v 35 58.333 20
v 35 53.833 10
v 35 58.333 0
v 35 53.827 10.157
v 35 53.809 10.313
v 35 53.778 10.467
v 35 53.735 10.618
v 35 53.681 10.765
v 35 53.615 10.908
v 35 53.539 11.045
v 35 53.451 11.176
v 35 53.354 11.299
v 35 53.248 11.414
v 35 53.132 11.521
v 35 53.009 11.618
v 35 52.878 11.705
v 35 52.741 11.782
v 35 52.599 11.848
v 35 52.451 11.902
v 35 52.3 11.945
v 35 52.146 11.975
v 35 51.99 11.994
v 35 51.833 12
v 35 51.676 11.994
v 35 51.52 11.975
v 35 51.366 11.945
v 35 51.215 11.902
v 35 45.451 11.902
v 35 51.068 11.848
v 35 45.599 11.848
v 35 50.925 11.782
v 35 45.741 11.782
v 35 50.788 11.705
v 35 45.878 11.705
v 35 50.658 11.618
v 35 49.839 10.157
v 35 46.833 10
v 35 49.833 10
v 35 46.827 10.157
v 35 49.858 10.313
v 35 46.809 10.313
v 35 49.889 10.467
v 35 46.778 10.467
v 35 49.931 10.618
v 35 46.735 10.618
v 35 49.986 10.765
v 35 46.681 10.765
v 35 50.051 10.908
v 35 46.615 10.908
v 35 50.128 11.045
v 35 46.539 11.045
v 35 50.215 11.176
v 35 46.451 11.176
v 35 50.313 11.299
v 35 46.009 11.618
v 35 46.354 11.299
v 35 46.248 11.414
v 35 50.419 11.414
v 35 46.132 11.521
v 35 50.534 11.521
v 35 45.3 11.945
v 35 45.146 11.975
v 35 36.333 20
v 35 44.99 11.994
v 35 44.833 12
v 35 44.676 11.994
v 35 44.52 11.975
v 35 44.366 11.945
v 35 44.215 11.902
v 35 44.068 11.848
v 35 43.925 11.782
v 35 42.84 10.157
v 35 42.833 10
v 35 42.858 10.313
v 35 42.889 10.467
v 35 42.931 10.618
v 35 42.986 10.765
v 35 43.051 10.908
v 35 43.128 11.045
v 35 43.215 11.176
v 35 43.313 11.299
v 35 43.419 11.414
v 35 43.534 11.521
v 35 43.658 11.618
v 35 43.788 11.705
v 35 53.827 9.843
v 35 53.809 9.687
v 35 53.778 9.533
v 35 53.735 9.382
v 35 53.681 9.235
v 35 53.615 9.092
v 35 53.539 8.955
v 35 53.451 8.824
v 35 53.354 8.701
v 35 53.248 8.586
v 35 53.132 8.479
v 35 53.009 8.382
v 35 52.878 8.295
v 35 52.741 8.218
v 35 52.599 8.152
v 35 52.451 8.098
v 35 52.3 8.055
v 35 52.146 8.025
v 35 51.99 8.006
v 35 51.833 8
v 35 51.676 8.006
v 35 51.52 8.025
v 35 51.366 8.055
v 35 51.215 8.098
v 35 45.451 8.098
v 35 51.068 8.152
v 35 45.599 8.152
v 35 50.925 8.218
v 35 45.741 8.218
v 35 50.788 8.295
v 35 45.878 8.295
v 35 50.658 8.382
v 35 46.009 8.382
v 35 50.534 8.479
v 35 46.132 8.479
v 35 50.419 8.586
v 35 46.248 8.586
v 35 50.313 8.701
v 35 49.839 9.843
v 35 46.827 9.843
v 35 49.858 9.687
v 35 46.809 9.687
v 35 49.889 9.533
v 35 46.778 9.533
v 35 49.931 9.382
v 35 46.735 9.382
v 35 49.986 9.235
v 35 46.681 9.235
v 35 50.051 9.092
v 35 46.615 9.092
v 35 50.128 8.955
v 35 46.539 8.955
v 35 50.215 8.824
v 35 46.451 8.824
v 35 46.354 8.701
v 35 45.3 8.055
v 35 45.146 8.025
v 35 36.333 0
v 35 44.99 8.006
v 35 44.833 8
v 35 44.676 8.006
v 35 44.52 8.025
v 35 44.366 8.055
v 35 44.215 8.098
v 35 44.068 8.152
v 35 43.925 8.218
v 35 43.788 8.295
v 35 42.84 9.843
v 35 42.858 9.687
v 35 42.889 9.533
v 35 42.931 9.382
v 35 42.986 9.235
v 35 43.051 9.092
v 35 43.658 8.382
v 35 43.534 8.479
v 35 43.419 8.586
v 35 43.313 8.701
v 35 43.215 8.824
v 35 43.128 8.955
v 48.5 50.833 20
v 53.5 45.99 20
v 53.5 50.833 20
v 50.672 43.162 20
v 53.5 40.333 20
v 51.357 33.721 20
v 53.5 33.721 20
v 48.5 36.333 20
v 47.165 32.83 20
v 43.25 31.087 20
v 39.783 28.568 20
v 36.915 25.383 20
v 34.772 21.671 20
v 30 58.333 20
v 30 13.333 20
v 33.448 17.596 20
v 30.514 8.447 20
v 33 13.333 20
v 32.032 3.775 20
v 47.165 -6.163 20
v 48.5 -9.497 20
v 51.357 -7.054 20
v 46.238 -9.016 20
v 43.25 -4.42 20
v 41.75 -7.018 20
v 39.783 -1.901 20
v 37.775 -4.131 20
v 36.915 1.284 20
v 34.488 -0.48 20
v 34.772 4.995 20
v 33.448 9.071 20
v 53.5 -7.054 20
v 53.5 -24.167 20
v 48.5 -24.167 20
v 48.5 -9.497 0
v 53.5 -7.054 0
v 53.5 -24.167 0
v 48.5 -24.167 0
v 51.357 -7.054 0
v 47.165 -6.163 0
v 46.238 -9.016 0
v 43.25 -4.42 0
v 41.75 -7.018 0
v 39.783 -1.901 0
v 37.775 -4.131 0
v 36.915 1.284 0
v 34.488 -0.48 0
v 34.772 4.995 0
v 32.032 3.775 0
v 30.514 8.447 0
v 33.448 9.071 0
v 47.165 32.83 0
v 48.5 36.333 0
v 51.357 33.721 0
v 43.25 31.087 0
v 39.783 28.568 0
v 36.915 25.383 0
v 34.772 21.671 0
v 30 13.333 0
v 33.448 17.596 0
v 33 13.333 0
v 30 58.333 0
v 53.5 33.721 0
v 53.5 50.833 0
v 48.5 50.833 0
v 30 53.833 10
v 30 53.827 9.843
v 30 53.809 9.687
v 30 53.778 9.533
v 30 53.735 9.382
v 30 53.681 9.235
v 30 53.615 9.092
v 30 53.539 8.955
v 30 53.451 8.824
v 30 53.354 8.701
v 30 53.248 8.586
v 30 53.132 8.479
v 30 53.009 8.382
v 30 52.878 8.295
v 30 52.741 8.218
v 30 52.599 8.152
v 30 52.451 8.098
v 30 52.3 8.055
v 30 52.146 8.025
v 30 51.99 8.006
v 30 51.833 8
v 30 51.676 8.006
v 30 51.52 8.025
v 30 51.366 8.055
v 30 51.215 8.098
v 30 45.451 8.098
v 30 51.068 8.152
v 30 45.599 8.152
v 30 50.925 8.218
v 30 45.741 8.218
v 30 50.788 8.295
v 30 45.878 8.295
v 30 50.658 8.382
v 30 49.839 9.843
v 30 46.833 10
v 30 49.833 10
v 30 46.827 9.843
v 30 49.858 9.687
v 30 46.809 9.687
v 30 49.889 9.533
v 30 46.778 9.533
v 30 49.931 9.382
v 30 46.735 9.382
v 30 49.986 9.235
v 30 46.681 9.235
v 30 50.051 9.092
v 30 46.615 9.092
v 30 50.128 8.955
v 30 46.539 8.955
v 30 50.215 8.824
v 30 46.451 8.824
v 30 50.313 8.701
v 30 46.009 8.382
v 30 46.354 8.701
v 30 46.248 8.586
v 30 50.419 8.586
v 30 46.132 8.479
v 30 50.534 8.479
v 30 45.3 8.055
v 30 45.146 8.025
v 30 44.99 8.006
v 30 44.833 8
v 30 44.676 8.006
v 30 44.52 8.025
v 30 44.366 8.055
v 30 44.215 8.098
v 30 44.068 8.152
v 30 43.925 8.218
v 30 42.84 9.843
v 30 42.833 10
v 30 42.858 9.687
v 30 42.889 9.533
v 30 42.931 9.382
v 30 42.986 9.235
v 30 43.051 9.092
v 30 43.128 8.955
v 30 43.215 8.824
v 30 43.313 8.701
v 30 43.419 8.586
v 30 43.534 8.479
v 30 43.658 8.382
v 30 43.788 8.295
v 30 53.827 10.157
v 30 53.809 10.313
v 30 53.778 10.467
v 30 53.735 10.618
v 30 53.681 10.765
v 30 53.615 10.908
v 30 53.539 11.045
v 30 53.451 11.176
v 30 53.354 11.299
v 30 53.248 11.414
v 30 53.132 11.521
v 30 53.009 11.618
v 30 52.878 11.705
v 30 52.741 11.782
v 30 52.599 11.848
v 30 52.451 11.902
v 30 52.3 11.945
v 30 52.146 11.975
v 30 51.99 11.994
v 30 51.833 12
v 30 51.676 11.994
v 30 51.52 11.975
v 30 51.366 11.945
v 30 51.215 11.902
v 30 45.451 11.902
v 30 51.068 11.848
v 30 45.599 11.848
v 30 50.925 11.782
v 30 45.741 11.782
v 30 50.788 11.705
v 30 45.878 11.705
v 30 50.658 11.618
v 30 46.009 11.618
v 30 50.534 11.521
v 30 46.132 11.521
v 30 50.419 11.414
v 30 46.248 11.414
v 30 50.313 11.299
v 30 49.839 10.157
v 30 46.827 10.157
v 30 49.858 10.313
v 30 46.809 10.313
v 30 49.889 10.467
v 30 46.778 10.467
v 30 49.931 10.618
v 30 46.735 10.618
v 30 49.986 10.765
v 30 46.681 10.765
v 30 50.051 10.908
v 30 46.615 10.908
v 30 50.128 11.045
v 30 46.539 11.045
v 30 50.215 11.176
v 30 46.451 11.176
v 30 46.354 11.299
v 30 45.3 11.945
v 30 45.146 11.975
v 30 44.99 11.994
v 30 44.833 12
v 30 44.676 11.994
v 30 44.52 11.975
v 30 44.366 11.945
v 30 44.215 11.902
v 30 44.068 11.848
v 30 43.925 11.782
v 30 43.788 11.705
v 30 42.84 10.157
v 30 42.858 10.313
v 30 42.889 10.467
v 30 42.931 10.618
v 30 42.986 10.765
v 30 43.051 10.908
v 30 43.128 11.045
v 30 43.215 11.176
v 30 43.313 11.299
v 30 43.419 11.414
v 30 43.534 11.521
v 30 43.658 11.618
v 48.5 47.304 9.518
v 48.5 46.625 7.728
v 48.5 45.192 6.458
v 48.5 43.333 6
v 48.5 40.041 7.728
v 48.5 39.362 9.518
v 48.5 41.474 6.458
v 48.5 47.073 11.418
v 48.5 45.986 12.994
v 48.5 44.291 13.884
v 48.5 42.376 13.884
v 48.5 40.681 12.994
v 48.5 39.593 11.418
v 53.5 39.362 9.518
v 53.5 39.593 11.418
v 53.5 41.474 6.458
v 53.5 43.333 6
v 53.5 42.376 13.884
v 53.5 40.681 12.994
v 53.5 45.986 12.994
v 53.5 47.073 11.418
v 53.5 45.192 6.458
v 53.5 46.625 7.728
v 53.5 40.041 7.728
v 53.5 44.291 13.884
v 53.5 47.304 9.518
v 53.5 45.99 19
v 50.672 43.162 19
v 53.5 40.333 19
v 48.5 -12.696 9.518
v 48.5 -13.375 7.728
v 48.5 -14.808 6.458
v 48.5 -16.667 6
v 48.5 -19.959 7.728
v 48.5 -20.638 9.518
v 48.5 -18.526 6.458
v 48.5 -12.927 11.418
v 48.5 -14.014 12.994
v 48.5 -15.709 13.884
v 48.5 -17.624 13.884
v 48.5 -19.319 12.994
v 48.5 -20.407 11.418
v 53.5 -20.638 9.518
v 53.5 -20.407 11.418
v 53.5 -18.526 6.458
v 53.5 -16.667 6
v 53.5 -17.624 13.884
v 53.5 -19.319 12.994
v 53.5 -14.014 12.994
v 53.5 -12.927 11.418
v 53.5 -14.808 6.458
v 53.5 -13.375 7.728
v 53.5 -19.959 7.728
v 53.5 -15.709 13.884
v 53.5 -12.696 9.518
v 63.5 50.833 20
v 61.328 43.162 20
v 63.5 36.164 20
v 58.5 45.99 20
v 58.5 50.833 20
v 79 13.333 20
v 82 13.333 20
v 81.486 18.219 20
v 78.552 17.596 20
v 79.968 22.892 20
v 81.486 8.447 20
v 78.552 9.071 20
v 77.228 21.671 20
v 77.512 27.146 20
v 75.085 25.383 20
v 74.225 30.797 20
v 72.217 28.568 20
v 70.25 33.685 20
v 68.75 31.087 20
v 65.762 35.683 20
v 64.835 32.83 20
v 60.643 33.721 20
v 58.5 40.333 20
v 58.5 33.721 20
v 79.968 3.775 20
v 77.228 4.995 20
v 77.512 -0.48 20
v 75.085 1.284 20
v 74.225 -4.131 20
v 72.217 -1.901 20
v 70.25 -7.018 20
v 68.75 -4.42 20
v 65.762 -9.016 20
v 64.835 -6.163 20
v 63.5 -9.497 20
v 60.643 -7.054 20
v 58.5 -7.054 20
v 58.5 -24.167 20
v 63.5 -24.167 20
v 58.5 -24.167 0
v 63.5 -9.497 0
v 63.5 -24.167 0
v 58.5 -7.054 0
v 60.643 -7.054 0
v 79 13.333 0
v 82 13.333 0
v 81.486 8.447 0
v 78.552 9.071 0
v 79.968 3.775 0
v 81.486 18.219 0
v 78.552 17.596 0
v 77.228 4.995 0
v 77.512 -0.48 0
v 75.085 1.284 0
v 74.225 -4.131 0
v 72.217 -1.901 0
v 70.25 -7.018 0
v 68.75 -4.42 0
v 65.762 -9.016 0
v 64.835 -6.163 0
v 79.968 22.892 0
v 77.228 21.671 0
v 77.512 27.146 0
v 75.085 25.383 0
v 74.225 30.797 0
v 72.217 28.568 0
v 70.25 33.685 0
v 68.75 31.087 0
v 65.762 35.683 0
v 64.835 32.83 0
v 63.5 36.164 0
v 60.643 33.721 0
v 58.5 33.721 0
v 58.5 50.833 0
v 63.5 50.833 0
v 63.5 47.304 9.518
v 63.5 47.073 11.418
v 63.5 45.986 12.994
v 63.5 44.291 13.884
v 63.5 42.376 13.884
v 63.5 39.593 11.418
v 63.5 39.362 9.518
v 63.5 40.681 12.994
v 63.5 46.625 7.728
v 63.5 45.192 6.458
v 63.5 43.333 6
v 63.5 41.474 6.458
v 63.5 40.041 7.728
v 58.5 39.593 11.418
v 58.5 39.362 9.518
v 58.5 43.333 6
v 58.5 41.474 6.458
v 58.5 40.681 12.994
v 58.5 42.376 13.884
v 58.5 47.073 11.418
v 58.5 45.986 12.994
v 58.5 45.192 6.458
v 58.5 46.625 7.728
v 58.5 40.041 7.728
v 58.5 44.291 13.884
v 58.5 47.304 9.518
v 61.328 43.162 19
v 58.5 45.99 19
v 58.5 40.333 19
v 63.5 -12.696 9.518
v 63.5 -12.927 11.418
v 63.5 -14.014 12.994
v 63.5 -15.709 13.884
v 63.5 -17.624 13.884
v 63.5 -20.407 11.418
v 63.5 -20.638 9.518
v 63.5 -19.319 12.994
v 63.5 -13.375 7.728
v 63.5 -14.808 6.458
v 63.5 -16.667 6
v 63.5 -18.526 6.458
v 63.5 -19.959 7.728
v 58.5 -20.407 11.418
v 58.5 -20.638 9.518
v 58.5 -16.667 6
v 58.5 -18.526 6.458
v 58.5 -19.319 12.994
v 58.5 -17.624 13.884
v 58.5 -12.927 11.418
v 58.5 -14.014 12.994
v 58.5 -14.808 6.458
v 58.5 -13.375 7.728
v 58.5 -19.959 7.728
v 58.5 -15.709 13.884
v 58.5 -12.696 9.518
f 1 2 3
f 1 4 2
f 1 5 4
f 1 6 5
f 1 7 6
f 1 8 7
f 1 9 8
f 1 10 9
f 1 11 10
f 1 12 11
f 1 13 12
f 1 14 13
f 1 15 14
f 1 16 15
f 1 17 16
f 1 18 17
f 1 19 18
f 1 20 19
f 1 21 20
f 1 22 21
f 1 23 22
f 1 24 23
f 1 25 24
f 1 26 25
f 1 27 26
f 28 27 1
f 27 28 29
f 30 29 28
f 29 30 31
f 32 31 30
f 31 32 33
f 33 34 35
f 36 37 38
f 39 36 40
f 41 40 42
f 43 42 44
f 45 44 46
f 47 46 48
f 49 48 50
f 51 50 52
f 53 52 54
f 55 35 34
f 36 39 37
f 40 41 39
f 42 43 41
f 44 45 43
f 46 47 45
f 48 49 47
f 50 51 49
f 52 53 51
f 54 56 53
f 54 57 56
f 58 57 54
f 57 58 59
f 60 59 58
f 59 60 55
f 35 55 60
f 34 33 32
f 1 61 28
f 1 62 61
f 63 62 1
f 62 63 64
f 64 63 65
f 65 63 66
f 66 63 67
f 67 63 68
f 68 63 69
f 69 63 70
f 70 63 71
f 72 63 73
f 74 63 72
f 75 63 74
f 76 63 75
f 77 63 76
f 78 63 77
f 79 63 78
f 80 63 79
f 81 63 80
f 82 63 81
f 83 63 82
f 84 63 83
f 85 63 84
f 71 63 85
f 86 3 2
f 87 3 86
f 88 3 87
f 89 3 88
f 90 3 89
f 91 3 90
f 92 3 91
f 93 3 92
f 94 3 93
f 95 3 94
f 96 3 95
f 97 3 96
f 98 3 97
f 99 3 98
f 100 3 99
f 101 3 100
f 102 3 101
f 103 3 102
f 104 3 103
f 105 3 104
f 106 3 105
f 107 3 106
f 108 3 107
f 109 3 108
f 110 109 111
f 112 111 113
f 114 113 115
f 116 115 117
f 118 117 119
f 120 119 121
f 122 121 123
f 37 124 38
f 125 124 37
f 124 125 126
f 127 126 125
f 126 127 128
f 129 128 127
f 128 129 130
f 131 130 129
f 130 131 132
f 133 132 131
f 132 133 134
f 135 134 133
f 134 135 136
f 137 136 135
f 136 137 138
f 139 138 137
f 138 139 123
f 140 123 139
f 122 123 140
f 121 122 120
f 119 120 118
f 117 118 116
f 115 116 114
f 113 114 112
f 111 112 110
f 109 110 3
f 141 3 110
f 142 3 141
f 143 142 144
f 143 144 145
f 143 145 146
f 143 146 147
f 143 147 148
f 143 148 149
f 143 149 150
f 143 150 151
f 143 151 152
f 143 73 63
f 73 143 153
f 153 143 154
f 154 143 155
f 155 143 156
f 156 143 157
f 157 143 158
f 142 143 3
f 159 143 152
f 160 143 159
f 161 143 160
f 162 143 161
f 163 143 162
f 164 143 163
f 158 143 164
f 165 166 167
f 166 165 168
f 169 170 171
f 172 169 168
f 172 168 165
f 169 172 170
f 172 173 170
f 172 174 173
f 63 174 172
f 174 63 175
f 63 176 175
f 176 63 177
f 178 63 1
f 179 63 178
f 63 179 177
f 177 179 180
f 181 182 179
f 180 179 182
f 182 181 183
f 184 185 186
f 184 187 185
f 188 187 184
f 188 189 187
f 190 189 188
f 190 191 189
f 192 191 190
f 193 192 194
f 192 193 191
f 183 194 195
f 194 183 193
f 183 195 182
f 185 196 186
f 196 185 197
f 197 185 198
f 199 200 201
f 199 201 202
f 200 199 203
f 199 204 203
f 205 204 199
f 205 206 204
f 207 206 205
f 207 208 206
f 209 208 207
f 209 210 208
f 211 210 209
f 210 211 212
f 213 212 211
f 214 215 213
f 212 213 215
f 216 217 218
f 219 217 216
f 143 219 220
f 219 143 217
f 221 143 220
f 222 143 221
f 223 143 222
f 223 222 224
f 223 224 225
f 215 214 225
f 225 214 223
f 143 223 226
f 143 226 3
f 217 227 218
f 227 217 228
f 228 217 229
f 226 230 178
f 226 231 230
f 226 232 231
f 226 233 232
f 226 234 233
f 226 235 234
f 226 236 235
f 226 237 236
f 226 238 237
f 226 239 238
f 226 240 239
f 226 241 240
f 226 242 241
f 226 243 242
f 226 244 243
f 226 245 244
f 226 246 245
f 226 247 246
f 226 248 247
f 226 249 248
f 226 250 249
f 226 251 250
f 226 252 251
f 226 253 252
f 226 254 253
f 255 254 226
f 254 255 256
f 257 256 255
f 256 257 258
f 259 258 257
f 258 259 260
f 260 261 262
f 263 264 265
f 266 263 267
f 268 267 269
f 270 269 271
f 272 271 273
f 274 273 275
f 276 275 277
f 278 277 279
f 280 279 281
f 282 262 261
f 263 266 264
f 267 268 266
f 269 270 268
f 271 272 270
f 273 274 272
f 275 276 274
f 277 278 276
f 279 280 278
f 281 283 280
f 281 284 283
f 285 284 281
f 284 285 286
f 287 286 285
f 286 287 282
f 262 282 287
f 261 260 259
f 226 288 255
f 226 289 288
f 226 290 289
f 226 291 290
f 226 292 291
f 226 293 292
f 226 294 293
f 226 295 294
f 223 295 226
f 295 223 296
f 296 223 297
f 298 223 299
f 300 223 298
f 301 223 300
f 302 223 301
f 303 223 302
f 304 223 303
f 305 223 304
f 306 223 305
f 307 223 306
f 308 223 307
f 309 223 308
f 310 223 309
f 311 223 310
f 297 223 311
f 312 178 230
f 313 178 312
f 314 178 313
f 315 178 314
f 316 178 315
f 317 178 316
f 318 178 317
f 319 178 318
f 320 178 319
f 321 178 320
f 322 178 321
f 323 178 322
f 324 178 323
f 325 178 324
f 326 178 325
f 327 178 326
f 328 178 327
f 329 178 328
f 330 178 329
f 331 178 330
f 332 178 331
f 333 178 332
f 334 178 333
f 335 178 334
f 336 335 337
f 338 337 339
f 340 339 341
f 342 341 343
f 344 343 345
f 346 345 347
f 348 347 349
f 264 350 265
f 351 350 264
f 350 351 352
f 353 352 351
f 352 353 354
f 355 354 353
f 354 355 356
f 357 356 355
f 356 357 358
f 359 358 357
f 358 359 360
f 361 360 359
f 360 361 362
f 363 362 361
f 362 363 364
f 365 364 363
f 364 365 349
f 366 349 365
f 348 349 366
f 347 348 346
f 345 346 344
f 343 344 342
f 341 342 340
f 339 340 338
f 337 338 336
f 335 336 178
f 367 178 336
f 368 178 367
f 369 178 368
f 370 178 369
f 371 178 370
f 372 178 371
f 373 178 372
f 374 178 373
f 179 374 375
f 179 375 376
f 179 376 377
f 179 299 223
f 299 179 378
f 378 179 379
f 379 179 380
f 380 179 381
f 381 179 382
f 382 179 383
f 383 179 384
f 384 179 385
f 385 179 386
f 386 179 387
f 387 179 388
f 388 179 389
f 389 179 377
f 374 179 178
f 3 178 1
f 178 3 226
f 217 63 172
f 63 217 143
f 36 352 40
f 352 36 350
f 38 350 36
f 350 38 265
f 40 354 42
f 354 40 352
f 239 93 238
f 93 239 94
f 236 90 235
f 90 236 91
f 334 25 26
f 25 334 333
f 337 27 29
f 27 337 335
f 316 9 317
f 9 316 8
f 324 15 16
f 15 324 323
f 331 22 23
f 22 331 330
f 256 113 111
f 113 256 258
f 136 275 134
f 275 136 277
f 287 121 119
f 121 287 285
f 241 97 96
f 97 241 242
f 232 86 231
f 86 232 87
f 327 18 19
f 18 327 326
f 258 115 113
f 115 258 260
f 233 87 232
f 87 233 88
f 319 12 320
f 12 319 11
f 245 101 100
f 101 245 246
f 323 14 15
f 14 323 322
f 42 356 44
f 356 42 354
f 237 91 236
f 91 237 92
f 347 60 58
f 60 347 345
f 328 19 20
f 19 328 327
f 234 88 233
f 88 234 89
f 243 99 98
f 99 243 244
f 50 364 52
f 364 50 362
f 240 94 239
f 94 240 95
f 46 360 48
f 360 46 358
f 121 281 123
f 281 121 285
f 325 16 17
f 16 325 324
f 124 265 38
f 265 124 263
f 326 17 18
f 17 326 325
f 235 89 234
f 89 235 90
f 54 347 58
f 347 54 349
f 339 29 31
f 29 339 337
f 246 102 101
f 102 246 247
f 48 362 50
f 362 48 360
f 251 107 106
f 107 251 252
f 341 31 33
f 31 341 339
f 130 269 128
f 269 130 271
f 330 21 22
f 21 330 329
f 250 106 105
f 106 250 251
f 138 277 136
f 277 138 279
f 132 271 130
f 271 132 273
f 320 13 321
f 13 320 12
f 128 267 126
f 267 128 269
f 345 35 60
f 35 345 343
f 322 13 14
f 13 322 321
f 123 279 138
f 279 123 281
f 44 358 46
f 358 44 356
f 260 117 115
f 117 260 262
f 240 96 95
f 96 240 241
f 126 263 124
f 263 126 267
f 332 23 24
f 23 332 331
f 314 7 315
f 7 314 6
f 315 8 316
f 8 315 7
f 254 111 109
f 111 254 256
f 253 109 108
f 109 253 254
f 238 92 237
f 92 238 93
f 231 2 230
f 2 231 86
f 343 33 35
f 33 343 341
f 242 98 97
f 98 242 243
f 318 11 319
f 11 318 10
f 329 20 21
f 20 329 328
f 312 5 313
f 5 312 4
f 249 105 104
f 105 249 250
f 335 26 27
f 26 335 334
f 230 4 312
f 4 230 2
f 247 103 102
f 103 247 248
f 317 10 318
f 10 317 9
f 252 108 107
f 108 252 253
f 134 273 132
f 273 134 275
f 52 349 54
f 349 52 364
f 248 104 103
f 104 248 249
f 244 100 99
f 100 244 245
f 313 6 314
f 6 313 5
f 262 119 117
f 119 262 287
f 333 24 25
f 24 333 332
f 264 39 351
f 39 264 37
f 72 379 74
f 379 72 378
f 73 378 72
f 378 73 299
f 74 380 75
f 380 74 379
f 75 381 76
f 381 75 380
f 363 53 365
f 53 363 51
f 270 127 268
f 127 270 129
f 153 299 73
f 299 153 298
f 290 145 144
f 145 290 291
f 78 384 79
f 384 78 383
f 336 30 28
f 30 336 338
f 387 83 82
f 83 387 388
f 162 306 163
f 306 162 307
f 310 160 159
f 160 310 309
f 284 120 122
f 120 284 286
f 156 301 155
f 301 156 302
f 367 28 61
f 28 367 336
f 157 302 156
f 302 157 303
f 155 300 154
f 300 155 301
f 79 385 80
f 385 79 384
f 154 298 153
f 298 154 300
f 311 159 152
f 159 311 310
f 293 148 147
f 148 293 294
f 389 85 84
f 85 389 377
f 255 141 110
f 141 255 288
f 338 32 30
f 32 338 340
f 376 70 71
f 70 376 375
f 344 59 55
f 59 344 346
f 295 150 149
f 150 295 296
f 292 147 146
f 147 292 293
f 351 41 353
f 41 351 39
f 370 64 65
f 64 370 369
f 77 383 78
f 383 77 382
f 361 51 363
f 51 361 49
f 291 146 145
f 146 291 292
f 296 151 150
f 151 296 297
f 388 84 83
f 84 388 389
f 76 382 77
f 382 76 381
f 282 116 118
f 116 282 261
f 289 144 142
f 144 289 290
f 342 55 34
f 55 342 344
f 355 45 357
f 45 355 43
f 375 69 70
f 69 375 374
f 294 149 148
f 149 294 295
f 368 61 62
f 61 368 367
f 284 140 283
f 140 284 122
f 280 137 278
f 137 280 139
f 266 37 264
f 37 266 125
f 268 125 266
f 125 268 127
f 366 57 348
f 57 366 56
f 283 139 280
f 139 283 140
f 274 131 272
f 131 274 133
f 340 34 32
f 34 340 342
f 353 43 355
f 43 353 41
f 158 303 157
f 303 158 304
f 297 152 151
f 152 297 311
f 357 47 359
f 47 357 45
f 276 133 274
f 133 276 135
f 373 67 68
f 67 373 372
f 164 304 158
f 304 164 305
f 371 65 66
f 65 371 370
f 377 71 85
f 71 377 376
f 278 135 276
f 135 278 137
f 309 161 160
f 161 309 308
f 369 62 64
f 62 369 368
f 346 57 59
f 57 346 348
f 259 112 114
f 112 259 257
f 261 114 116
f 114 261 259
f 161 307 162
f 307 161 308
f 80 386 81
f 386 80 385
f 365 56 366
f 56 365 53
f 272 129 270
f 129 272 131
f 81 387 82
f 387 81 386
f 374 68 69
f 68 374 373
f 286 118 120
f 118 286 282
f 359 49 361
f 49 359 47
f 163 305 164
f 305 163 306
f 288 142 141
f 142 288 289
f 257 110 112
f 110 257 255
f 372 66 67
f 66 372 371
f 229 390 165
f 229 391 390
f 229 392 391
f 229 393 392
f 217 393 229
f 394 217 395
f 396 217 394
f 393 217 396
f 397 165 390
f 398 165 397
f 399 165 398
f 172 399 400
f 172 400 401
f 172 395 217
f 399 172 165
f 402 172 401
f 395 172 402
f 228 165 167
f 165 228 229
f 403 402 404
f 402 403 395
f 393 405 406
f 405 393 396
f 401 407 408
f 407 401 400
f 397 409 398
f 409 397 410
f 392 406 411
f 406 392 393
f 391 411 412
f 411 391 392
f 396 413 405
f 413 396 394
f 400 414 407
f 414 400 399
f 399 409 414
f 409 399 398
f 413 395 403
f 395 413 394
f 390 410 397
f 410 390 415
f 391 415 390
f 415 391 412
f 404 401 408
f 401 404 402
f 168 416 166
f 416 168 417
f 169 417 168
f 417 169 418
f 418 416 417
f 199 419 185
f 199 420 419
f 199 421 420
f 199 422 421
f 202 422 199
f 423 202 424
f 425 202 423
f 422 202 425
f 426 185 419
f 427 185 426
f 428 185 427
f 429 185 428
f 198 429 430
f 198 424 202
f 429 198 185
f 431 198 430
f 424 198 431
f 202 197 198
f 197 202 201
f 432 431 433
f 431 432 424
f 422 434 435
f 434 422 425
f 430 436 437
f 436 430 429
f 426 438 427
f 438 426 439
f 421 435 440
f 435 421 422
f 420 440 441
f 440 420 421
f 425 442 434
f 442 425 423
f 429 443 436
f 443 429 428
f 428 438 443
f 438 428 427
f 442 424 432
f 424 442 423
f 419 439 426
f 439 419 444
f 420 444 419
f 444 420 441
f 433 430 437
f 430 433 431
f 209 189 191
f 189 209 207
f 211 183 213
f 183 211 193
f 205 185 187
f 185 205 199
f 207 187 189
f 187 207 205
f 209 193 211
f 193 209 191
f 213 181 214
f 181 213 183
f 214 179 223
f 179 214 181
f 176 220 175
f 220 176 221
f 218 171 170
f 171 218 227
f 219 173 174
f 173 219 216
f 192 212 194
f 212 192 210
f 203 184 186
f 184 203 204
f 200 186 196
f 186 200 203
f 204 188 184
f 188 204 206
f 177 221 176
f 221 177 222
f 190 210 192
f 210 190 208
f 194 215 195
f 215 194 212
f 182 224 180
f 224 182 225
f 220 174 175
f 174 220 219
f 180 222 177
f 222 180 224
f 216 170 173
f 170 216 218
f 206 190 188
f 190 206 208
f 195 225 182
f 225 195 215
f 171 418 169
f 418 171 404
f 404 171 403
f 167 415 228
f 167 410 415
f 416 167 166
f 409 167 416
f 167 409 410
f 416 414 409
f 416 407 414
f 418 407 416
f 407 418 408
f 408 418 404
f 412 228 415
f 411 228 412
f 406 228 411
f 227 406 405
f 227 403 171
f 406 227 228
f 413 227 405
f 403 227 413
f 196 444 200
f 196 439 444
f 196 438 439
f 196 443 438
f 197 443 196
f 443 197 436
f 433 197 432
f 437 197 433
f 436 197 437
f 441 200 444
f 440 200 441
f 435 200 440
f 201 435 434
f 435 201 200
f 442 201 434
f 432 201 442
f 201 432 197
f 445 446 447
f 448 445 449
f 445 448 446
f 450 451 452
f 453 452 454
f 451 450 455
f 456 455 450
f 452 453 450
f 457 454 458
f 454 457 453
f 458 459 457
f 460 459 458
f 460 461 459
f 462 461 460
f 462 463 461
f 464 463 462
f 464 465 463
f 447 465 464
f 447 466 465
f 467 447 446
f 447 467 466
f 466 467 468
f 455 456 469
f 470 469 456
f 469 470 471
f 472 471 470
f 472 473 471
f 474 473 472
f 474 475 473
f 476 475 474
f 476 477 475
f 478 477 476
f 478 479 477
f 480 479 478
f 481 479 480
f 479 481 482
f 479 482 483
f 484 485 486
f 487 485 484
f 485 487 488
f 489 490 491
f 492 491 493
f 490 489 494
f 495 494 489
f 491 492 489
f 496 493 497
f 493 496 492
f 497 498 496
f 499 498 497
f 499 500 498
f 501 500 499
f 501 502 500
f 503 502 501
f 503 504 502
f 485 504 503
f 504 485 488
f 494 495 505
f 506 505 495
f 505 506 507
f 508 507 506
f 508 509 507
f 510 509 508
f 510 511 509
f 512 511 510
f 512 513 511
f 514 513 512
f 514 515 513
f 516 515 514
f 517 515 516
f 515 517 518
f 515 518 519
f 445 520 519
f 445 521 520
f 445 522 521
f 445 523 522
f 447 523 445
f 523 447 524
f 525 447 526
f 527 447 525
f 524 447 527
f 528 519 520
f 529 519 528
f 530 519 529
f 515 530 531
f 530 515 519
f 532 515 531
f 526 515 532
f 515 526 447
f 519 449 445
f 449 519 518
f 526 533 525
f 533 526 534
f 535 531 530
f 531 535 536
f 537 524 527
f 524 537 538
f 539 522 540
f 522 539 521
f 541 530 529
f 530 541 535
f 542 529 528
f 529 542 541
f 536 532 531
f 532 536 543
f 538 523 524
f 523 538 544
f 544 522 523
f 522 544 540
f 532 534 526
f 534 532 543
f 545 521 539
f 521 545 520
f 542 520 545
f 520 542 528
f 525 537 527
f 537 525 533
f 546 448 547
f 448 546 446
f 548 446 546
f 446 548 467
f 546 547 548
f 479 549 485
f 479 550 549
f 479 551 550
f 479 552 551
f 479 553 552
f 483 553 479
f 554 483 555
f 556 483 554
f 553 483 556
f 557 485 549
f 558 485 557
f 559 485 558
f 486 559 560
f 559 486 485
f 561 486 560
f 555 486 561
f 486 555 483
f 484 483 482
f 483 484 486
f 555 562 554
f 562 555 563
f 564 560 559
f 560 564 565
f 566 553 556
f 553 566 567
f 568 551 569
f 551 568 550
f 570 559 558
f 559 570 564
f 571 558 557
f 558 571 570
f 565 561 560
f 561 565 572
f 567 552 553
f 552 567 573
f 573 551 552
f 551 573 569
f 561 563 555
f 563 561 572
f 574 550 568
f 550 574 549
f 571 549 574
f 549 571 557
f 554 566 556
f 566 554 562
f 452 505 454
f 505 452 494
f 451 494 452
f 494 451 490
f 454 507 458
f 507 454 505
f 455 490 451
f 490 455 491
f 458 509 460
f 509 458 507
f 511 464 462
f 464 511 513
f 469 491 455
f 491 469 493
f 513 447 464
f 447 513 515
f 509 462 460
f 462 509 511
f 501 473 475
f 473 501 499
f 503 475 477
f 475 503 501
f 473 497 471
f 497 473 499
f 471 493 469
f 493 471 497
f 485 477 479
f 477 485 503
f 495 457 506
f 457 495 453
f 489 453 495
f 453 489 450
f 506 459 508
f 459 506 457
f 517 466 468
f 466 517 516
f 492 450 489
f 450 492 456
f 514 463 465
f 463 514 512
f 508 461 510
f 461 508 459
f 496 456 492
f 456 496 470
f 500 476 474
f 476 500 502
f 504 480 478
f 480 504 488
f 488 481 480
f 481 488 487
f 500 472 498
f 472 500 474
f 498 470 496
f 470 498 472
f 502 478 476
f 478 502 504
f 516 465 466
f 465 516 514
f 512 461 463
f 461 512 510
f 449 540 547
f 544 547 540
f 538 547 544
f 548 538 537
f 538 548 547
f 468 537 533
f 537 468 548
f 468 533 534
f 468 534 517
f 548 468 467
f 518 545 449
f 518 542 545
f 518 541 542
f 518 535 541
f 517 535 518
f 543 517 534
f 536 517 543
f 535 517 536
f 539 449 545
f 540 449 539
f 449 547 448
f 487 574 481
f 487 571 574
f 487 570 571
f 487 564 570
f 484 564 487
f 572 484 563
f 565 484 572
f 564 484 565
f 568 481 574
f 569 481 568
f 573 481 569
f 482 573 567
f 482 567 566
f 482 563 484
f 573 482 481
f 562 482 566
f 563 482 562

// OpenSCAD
// file: side-mount.scad
/*
 * Side panel of the rack which has mounting holes to mount the rack in some other enclosure or racking.
 */

use <warpDisk.scad>;
use <boltHoles.scad>;

/*
 * Side mounting holes.
 *
 * Use this module to add these holes to your own module so they align up correctly
 * with this panel
 */
module SideMount(thickness) {
    for(x=[-3.5,3.5]) {
        for(y=[-13,13]) {
            translate([x,y,-1])
                MHole(3,thickness+2);
        }
    }
}
/*
 * Full size side panel - This defines a full size
 * side=0 for left, 1 for right
 */
module FullSidePanel(width, height, thickness,side=0) {
    difference() {
        union() {
            // Panel
            cube([thickness,width,height]);

            // Side mounts
            x= side==0 ? thickness-1 : -13;
            for(z=[2,height-thickness]) {
                translate([x,21,z])
                    cube([15,20,3]);
            }
        }

        // Mounting holes
        translate([0,25,height/2])
            rotate([90,0,90])
            SideMount(thickness);
        /* Alternate arrangement with 2 sets of holes
        for(y=[30,height-30]) {
            translate([0, 25, y]) rotate([90,0,90]) SideMount(thickness);
        }
        */

        // Mounting holes onto the top/bottom plates
        x= side==0 ? 10 : -5;
        for(z=[2,height-thickness]) {
            translate([x,35,z-1])
                MHole(4,5);
        }

        /* Cutouts for easy removal from the bed */
        for(y=[0,135]) {
            translate([-2,18,y-1])
                cube([3,4,3]);
        }
        for(x=[40,70,96]) {
            translate([-2,39,x-1])
                cube([3,3,4]);
        }
    }

}
// file: boltHoles.scad
/*
 * This code is licensed under the CC BY-NC-SA 4.0 (Attribution-NonCommercial-ShareAlike).
 * Please read LICENCE.md for full details.
 *
 * A set of modules for creating bolt holes at specific sizes
 *
 * All of these modules will render flat on the XY plane and centered on the origin.
 * Heights are measured along the Y axis.
 * Widths are measured along the X axis.
 * Thickness are measured along the Z axis.
 */

/*
 * M mounting hole. Radius is (Msize/2) + 0.25mm
 * The 0.5mm gives some extra room so the bolt does not get restricted by the plastic & is free to move.
 *
 * size The size of the hole, e.g. 4 for a M4 bolt
 * t    The thickness of the material the hole is in
 */
module MHole(size,t) {
    translate([0, 0, -1]) cylinder( r=(size/2)+.5, h=t+2, $fn=80);
}

/*
 * A rectangular slotted hole for bolts, used so there's some directional movement in attaching something.
 *
 * boltSize     The diameter of the bolt this slot is to fit. 0.5mm either side will be included in the slot
 * height       The height of the slot in mm
 * thickness    The thickness of the material the slot is to cut out.
 */
 module BoltSlot( boltSize,height, thickness) {
    translate([-(boltSize+1)/2,-height/2,-(thickness+1)/2])
        cube([boltSize+1, height, thickness+1]);
 }

/*
 * A bar with multiple slots cut out of it
 *
 * width The width of the bar
 * height The height of the bar
 * thickness The thickness of the bar
 * boltSize The size of bolt that will be used in the slot, remember slots are 10mm apart!
 * baseOffset The offset from the bottom to the bottom of the slot
 * topOffset The offset from the top of the slot from the top of the bar
 */
module SlottedBar(width, height, thickness, boltSize, baseOffset, topOffset) {
    bo = baseOffset <=0 ? thickness : baseOffset;
    to = topOffset <= 0 ? thickness : topOffset;
    
    // Y offset to middle of slot
    dy = baseOffset + ((height-baseOffset-topOffset)/2);
    
    // last slot index that fits, first slot is #0
    numSlots = floor(width/10)-1;
    
    translate([-width/2, -height/2, -thickness/2])
        difference() {
            // Actual bar
            cube([width, height, thickness]);
            for( n = [0:numSlots] ) {
                translate([ 5+(10*n), dy, thickness/2 ])
                    BoltSlot( boltSize, height-baseOffset-topOffset, thickness );
            }
        }
}

SlottedBar( 100, 20, 5, 4, 5, 5 );

translate([0,30,0])
SlottedBar( 100, 20, 5, 4, 7, 5 );

//BoltSlot( 4, 20, 5);
// file: warpDisk.scad
/*
 * This code is licensed under the CC BY-NC-SA 4.0 (Attribution-NonCommercial-ShareAlike).
 * Please read LICENCE.md for full details.
 *
 * A warp disk which is a simple 10mm x 0.6mm disk which is placed just touching a base corner of your model.
 * These disks then give the model extra area against a heated base plate on the printer and help in reducing
 * warping of the model
 */

module WarpDisk(x,y,z) {
    translate([x,y,z]) cylinder(r=5,h=.6,$fn=30);
}
// main file
/*
 * This code is licensed under the CC BY-NC-SA 4.0 (Attribution-NonCommercial-ShareAlike).
 * Please read LICENCE.md for full details.
 *
 * This is specific to my use case but this provides the means to attach our angle
 * brackets to an existing rack system.
 *
 * In my case this is plastic racking from a DIY store which has a 40mm diameter round
 * posts which this wraps around.
 *
 * It's here so we have an example of how to make custom mounts for other types of racking.
 *
 * Note: This is the raw original and hasn't been converted to use the common modules
 *       so there are some duplication. At some point I might clean this one up
 *       but as this is custom I've left it as is.
 */

use <warpDisk.scad>;
use <boltHoles.scad>;
use <side-mount.scad>;

/*
 * Mounting bracket
 */
width=40;
height=20;
t=5;

/*
 * holderDiam is the diameter of round holder.
 * Adjust this to be the inner diameter you are attaching the bracket to.
 * This doesn't need to be accurate but close & bigger the better.
 *
 * holderThickness is the thickness in mm of the bracket. Doesn't need to be
 * too thick but not too think that it'll break. 2 or 3mm is usually enough.
 */
holderDiam=41;
holderThickness=3;

module bracket( top ) {
    translate([6.5+holderThickness+holderDiam/2,0,0])
        difference() {
            union() {
                cube([t,width+5,height]);
                cube([t*4,2.5+holderDiam/2,height]);
                //cube([t*4,width-2.5,2]);
            }
            translate([5,10+(width+10)/2,height+3])
                rotate([180,90,0])
                rotate([0,0,90])
                SideMount(t);
        }
    /*
    rotate([ 90*top, 0, 0]) union() {
        //slottedPanel();
        //rotate([90,0,0]) translate([0,0,-t]) slottedPanel();
    }
    warpDisk(-3,-3);
    warpDisk(-3,height+3);
    warpDisk(width+3,-3);
    warpDisk(width+3,height+3);
    */

    //translate([t/2,0,0]) rotate([0,-90,0]) sideBracket();
    //translate([width,0,0]) rotate([0,-90,0]) sideBracket();
}

module slottedPanel() {
    difference() {
        cube([width,height,t]);
        for( n = [0:2] ) {
            translate([2.5+(10*n),8,-1]) {
                cube([5,8,10]);
            }
        }
    }
}


/*
 * Handles the rendering of the round holder bracket.
 *
 * This module renders each side of the part that attaches to a round post.
 *
 * side 0=left, 1=right to show/render
 * top  1=top, 0=bottom
 */
module roundHolder(side, top) {
    // Thickness of mount wall
    thickness=4;

    // Height of mount
    h=height;

    hr = (holderDiam/2)+holderThickness;

    x = width*3/4+(holderDiam/2)+holderThickness;
    y = width/3;
    difference() {
        // Union of the outer cylinder and the bracket
        union() {
            // bracket
            translate([ 0, y, 0]) bracket( top );

            // Outer cylinder
            translate([x,y,0])
                cylinder( r=hr, h=h, $rn=120 );

            // cylinder bolt mount
            translate([ x-5, y+hr-1, 0]) cylinderBoltMount(1);
            translate([ x-5, y-hr-15+1, 0]) cylinderBoltMount(0);
        }

        // Difference with the inner cylinder
        translate([x,y,-1])
            cylinder( r=holderDiam/2, h=h+2, $rn=120 );

        // Cut away the unwanted half
        translate([side ? 0 : x, y-hr-15, -1])
            cube([ side ? x : hr+10, (hr+30)*2, h+2 ]);
    }
}

/*
 * The bolt mount used to hold each half together
 *
 * align = 1 to show alignment marker
 */
module cylinderBoltMount( align ) {
    difference() {
        cube([ 10, 15, height ]);

        // Bolt hole
        translate([ -1, 15/2, height/2])
            rotate([ 0, 90, 0])
                cylinder( r=4, h=12, $rn=120 );

        // Alignment hole
        if( align ) {
        translate([5,4.5,height+1])
            rotate([0,90,45])
                cube([2,4,4]);
        }
    }
}

//cylinderBoltMount();
//bracket();
for ( n = [0:0] ) {
    rotate( [0, 0, 180*n] )
    translate([ -40*n, -70*n, 0 ])
    union() {
        roundHolder(0, n);
        translate([5,0,0]) roundHolder(1, n);
    }
}
